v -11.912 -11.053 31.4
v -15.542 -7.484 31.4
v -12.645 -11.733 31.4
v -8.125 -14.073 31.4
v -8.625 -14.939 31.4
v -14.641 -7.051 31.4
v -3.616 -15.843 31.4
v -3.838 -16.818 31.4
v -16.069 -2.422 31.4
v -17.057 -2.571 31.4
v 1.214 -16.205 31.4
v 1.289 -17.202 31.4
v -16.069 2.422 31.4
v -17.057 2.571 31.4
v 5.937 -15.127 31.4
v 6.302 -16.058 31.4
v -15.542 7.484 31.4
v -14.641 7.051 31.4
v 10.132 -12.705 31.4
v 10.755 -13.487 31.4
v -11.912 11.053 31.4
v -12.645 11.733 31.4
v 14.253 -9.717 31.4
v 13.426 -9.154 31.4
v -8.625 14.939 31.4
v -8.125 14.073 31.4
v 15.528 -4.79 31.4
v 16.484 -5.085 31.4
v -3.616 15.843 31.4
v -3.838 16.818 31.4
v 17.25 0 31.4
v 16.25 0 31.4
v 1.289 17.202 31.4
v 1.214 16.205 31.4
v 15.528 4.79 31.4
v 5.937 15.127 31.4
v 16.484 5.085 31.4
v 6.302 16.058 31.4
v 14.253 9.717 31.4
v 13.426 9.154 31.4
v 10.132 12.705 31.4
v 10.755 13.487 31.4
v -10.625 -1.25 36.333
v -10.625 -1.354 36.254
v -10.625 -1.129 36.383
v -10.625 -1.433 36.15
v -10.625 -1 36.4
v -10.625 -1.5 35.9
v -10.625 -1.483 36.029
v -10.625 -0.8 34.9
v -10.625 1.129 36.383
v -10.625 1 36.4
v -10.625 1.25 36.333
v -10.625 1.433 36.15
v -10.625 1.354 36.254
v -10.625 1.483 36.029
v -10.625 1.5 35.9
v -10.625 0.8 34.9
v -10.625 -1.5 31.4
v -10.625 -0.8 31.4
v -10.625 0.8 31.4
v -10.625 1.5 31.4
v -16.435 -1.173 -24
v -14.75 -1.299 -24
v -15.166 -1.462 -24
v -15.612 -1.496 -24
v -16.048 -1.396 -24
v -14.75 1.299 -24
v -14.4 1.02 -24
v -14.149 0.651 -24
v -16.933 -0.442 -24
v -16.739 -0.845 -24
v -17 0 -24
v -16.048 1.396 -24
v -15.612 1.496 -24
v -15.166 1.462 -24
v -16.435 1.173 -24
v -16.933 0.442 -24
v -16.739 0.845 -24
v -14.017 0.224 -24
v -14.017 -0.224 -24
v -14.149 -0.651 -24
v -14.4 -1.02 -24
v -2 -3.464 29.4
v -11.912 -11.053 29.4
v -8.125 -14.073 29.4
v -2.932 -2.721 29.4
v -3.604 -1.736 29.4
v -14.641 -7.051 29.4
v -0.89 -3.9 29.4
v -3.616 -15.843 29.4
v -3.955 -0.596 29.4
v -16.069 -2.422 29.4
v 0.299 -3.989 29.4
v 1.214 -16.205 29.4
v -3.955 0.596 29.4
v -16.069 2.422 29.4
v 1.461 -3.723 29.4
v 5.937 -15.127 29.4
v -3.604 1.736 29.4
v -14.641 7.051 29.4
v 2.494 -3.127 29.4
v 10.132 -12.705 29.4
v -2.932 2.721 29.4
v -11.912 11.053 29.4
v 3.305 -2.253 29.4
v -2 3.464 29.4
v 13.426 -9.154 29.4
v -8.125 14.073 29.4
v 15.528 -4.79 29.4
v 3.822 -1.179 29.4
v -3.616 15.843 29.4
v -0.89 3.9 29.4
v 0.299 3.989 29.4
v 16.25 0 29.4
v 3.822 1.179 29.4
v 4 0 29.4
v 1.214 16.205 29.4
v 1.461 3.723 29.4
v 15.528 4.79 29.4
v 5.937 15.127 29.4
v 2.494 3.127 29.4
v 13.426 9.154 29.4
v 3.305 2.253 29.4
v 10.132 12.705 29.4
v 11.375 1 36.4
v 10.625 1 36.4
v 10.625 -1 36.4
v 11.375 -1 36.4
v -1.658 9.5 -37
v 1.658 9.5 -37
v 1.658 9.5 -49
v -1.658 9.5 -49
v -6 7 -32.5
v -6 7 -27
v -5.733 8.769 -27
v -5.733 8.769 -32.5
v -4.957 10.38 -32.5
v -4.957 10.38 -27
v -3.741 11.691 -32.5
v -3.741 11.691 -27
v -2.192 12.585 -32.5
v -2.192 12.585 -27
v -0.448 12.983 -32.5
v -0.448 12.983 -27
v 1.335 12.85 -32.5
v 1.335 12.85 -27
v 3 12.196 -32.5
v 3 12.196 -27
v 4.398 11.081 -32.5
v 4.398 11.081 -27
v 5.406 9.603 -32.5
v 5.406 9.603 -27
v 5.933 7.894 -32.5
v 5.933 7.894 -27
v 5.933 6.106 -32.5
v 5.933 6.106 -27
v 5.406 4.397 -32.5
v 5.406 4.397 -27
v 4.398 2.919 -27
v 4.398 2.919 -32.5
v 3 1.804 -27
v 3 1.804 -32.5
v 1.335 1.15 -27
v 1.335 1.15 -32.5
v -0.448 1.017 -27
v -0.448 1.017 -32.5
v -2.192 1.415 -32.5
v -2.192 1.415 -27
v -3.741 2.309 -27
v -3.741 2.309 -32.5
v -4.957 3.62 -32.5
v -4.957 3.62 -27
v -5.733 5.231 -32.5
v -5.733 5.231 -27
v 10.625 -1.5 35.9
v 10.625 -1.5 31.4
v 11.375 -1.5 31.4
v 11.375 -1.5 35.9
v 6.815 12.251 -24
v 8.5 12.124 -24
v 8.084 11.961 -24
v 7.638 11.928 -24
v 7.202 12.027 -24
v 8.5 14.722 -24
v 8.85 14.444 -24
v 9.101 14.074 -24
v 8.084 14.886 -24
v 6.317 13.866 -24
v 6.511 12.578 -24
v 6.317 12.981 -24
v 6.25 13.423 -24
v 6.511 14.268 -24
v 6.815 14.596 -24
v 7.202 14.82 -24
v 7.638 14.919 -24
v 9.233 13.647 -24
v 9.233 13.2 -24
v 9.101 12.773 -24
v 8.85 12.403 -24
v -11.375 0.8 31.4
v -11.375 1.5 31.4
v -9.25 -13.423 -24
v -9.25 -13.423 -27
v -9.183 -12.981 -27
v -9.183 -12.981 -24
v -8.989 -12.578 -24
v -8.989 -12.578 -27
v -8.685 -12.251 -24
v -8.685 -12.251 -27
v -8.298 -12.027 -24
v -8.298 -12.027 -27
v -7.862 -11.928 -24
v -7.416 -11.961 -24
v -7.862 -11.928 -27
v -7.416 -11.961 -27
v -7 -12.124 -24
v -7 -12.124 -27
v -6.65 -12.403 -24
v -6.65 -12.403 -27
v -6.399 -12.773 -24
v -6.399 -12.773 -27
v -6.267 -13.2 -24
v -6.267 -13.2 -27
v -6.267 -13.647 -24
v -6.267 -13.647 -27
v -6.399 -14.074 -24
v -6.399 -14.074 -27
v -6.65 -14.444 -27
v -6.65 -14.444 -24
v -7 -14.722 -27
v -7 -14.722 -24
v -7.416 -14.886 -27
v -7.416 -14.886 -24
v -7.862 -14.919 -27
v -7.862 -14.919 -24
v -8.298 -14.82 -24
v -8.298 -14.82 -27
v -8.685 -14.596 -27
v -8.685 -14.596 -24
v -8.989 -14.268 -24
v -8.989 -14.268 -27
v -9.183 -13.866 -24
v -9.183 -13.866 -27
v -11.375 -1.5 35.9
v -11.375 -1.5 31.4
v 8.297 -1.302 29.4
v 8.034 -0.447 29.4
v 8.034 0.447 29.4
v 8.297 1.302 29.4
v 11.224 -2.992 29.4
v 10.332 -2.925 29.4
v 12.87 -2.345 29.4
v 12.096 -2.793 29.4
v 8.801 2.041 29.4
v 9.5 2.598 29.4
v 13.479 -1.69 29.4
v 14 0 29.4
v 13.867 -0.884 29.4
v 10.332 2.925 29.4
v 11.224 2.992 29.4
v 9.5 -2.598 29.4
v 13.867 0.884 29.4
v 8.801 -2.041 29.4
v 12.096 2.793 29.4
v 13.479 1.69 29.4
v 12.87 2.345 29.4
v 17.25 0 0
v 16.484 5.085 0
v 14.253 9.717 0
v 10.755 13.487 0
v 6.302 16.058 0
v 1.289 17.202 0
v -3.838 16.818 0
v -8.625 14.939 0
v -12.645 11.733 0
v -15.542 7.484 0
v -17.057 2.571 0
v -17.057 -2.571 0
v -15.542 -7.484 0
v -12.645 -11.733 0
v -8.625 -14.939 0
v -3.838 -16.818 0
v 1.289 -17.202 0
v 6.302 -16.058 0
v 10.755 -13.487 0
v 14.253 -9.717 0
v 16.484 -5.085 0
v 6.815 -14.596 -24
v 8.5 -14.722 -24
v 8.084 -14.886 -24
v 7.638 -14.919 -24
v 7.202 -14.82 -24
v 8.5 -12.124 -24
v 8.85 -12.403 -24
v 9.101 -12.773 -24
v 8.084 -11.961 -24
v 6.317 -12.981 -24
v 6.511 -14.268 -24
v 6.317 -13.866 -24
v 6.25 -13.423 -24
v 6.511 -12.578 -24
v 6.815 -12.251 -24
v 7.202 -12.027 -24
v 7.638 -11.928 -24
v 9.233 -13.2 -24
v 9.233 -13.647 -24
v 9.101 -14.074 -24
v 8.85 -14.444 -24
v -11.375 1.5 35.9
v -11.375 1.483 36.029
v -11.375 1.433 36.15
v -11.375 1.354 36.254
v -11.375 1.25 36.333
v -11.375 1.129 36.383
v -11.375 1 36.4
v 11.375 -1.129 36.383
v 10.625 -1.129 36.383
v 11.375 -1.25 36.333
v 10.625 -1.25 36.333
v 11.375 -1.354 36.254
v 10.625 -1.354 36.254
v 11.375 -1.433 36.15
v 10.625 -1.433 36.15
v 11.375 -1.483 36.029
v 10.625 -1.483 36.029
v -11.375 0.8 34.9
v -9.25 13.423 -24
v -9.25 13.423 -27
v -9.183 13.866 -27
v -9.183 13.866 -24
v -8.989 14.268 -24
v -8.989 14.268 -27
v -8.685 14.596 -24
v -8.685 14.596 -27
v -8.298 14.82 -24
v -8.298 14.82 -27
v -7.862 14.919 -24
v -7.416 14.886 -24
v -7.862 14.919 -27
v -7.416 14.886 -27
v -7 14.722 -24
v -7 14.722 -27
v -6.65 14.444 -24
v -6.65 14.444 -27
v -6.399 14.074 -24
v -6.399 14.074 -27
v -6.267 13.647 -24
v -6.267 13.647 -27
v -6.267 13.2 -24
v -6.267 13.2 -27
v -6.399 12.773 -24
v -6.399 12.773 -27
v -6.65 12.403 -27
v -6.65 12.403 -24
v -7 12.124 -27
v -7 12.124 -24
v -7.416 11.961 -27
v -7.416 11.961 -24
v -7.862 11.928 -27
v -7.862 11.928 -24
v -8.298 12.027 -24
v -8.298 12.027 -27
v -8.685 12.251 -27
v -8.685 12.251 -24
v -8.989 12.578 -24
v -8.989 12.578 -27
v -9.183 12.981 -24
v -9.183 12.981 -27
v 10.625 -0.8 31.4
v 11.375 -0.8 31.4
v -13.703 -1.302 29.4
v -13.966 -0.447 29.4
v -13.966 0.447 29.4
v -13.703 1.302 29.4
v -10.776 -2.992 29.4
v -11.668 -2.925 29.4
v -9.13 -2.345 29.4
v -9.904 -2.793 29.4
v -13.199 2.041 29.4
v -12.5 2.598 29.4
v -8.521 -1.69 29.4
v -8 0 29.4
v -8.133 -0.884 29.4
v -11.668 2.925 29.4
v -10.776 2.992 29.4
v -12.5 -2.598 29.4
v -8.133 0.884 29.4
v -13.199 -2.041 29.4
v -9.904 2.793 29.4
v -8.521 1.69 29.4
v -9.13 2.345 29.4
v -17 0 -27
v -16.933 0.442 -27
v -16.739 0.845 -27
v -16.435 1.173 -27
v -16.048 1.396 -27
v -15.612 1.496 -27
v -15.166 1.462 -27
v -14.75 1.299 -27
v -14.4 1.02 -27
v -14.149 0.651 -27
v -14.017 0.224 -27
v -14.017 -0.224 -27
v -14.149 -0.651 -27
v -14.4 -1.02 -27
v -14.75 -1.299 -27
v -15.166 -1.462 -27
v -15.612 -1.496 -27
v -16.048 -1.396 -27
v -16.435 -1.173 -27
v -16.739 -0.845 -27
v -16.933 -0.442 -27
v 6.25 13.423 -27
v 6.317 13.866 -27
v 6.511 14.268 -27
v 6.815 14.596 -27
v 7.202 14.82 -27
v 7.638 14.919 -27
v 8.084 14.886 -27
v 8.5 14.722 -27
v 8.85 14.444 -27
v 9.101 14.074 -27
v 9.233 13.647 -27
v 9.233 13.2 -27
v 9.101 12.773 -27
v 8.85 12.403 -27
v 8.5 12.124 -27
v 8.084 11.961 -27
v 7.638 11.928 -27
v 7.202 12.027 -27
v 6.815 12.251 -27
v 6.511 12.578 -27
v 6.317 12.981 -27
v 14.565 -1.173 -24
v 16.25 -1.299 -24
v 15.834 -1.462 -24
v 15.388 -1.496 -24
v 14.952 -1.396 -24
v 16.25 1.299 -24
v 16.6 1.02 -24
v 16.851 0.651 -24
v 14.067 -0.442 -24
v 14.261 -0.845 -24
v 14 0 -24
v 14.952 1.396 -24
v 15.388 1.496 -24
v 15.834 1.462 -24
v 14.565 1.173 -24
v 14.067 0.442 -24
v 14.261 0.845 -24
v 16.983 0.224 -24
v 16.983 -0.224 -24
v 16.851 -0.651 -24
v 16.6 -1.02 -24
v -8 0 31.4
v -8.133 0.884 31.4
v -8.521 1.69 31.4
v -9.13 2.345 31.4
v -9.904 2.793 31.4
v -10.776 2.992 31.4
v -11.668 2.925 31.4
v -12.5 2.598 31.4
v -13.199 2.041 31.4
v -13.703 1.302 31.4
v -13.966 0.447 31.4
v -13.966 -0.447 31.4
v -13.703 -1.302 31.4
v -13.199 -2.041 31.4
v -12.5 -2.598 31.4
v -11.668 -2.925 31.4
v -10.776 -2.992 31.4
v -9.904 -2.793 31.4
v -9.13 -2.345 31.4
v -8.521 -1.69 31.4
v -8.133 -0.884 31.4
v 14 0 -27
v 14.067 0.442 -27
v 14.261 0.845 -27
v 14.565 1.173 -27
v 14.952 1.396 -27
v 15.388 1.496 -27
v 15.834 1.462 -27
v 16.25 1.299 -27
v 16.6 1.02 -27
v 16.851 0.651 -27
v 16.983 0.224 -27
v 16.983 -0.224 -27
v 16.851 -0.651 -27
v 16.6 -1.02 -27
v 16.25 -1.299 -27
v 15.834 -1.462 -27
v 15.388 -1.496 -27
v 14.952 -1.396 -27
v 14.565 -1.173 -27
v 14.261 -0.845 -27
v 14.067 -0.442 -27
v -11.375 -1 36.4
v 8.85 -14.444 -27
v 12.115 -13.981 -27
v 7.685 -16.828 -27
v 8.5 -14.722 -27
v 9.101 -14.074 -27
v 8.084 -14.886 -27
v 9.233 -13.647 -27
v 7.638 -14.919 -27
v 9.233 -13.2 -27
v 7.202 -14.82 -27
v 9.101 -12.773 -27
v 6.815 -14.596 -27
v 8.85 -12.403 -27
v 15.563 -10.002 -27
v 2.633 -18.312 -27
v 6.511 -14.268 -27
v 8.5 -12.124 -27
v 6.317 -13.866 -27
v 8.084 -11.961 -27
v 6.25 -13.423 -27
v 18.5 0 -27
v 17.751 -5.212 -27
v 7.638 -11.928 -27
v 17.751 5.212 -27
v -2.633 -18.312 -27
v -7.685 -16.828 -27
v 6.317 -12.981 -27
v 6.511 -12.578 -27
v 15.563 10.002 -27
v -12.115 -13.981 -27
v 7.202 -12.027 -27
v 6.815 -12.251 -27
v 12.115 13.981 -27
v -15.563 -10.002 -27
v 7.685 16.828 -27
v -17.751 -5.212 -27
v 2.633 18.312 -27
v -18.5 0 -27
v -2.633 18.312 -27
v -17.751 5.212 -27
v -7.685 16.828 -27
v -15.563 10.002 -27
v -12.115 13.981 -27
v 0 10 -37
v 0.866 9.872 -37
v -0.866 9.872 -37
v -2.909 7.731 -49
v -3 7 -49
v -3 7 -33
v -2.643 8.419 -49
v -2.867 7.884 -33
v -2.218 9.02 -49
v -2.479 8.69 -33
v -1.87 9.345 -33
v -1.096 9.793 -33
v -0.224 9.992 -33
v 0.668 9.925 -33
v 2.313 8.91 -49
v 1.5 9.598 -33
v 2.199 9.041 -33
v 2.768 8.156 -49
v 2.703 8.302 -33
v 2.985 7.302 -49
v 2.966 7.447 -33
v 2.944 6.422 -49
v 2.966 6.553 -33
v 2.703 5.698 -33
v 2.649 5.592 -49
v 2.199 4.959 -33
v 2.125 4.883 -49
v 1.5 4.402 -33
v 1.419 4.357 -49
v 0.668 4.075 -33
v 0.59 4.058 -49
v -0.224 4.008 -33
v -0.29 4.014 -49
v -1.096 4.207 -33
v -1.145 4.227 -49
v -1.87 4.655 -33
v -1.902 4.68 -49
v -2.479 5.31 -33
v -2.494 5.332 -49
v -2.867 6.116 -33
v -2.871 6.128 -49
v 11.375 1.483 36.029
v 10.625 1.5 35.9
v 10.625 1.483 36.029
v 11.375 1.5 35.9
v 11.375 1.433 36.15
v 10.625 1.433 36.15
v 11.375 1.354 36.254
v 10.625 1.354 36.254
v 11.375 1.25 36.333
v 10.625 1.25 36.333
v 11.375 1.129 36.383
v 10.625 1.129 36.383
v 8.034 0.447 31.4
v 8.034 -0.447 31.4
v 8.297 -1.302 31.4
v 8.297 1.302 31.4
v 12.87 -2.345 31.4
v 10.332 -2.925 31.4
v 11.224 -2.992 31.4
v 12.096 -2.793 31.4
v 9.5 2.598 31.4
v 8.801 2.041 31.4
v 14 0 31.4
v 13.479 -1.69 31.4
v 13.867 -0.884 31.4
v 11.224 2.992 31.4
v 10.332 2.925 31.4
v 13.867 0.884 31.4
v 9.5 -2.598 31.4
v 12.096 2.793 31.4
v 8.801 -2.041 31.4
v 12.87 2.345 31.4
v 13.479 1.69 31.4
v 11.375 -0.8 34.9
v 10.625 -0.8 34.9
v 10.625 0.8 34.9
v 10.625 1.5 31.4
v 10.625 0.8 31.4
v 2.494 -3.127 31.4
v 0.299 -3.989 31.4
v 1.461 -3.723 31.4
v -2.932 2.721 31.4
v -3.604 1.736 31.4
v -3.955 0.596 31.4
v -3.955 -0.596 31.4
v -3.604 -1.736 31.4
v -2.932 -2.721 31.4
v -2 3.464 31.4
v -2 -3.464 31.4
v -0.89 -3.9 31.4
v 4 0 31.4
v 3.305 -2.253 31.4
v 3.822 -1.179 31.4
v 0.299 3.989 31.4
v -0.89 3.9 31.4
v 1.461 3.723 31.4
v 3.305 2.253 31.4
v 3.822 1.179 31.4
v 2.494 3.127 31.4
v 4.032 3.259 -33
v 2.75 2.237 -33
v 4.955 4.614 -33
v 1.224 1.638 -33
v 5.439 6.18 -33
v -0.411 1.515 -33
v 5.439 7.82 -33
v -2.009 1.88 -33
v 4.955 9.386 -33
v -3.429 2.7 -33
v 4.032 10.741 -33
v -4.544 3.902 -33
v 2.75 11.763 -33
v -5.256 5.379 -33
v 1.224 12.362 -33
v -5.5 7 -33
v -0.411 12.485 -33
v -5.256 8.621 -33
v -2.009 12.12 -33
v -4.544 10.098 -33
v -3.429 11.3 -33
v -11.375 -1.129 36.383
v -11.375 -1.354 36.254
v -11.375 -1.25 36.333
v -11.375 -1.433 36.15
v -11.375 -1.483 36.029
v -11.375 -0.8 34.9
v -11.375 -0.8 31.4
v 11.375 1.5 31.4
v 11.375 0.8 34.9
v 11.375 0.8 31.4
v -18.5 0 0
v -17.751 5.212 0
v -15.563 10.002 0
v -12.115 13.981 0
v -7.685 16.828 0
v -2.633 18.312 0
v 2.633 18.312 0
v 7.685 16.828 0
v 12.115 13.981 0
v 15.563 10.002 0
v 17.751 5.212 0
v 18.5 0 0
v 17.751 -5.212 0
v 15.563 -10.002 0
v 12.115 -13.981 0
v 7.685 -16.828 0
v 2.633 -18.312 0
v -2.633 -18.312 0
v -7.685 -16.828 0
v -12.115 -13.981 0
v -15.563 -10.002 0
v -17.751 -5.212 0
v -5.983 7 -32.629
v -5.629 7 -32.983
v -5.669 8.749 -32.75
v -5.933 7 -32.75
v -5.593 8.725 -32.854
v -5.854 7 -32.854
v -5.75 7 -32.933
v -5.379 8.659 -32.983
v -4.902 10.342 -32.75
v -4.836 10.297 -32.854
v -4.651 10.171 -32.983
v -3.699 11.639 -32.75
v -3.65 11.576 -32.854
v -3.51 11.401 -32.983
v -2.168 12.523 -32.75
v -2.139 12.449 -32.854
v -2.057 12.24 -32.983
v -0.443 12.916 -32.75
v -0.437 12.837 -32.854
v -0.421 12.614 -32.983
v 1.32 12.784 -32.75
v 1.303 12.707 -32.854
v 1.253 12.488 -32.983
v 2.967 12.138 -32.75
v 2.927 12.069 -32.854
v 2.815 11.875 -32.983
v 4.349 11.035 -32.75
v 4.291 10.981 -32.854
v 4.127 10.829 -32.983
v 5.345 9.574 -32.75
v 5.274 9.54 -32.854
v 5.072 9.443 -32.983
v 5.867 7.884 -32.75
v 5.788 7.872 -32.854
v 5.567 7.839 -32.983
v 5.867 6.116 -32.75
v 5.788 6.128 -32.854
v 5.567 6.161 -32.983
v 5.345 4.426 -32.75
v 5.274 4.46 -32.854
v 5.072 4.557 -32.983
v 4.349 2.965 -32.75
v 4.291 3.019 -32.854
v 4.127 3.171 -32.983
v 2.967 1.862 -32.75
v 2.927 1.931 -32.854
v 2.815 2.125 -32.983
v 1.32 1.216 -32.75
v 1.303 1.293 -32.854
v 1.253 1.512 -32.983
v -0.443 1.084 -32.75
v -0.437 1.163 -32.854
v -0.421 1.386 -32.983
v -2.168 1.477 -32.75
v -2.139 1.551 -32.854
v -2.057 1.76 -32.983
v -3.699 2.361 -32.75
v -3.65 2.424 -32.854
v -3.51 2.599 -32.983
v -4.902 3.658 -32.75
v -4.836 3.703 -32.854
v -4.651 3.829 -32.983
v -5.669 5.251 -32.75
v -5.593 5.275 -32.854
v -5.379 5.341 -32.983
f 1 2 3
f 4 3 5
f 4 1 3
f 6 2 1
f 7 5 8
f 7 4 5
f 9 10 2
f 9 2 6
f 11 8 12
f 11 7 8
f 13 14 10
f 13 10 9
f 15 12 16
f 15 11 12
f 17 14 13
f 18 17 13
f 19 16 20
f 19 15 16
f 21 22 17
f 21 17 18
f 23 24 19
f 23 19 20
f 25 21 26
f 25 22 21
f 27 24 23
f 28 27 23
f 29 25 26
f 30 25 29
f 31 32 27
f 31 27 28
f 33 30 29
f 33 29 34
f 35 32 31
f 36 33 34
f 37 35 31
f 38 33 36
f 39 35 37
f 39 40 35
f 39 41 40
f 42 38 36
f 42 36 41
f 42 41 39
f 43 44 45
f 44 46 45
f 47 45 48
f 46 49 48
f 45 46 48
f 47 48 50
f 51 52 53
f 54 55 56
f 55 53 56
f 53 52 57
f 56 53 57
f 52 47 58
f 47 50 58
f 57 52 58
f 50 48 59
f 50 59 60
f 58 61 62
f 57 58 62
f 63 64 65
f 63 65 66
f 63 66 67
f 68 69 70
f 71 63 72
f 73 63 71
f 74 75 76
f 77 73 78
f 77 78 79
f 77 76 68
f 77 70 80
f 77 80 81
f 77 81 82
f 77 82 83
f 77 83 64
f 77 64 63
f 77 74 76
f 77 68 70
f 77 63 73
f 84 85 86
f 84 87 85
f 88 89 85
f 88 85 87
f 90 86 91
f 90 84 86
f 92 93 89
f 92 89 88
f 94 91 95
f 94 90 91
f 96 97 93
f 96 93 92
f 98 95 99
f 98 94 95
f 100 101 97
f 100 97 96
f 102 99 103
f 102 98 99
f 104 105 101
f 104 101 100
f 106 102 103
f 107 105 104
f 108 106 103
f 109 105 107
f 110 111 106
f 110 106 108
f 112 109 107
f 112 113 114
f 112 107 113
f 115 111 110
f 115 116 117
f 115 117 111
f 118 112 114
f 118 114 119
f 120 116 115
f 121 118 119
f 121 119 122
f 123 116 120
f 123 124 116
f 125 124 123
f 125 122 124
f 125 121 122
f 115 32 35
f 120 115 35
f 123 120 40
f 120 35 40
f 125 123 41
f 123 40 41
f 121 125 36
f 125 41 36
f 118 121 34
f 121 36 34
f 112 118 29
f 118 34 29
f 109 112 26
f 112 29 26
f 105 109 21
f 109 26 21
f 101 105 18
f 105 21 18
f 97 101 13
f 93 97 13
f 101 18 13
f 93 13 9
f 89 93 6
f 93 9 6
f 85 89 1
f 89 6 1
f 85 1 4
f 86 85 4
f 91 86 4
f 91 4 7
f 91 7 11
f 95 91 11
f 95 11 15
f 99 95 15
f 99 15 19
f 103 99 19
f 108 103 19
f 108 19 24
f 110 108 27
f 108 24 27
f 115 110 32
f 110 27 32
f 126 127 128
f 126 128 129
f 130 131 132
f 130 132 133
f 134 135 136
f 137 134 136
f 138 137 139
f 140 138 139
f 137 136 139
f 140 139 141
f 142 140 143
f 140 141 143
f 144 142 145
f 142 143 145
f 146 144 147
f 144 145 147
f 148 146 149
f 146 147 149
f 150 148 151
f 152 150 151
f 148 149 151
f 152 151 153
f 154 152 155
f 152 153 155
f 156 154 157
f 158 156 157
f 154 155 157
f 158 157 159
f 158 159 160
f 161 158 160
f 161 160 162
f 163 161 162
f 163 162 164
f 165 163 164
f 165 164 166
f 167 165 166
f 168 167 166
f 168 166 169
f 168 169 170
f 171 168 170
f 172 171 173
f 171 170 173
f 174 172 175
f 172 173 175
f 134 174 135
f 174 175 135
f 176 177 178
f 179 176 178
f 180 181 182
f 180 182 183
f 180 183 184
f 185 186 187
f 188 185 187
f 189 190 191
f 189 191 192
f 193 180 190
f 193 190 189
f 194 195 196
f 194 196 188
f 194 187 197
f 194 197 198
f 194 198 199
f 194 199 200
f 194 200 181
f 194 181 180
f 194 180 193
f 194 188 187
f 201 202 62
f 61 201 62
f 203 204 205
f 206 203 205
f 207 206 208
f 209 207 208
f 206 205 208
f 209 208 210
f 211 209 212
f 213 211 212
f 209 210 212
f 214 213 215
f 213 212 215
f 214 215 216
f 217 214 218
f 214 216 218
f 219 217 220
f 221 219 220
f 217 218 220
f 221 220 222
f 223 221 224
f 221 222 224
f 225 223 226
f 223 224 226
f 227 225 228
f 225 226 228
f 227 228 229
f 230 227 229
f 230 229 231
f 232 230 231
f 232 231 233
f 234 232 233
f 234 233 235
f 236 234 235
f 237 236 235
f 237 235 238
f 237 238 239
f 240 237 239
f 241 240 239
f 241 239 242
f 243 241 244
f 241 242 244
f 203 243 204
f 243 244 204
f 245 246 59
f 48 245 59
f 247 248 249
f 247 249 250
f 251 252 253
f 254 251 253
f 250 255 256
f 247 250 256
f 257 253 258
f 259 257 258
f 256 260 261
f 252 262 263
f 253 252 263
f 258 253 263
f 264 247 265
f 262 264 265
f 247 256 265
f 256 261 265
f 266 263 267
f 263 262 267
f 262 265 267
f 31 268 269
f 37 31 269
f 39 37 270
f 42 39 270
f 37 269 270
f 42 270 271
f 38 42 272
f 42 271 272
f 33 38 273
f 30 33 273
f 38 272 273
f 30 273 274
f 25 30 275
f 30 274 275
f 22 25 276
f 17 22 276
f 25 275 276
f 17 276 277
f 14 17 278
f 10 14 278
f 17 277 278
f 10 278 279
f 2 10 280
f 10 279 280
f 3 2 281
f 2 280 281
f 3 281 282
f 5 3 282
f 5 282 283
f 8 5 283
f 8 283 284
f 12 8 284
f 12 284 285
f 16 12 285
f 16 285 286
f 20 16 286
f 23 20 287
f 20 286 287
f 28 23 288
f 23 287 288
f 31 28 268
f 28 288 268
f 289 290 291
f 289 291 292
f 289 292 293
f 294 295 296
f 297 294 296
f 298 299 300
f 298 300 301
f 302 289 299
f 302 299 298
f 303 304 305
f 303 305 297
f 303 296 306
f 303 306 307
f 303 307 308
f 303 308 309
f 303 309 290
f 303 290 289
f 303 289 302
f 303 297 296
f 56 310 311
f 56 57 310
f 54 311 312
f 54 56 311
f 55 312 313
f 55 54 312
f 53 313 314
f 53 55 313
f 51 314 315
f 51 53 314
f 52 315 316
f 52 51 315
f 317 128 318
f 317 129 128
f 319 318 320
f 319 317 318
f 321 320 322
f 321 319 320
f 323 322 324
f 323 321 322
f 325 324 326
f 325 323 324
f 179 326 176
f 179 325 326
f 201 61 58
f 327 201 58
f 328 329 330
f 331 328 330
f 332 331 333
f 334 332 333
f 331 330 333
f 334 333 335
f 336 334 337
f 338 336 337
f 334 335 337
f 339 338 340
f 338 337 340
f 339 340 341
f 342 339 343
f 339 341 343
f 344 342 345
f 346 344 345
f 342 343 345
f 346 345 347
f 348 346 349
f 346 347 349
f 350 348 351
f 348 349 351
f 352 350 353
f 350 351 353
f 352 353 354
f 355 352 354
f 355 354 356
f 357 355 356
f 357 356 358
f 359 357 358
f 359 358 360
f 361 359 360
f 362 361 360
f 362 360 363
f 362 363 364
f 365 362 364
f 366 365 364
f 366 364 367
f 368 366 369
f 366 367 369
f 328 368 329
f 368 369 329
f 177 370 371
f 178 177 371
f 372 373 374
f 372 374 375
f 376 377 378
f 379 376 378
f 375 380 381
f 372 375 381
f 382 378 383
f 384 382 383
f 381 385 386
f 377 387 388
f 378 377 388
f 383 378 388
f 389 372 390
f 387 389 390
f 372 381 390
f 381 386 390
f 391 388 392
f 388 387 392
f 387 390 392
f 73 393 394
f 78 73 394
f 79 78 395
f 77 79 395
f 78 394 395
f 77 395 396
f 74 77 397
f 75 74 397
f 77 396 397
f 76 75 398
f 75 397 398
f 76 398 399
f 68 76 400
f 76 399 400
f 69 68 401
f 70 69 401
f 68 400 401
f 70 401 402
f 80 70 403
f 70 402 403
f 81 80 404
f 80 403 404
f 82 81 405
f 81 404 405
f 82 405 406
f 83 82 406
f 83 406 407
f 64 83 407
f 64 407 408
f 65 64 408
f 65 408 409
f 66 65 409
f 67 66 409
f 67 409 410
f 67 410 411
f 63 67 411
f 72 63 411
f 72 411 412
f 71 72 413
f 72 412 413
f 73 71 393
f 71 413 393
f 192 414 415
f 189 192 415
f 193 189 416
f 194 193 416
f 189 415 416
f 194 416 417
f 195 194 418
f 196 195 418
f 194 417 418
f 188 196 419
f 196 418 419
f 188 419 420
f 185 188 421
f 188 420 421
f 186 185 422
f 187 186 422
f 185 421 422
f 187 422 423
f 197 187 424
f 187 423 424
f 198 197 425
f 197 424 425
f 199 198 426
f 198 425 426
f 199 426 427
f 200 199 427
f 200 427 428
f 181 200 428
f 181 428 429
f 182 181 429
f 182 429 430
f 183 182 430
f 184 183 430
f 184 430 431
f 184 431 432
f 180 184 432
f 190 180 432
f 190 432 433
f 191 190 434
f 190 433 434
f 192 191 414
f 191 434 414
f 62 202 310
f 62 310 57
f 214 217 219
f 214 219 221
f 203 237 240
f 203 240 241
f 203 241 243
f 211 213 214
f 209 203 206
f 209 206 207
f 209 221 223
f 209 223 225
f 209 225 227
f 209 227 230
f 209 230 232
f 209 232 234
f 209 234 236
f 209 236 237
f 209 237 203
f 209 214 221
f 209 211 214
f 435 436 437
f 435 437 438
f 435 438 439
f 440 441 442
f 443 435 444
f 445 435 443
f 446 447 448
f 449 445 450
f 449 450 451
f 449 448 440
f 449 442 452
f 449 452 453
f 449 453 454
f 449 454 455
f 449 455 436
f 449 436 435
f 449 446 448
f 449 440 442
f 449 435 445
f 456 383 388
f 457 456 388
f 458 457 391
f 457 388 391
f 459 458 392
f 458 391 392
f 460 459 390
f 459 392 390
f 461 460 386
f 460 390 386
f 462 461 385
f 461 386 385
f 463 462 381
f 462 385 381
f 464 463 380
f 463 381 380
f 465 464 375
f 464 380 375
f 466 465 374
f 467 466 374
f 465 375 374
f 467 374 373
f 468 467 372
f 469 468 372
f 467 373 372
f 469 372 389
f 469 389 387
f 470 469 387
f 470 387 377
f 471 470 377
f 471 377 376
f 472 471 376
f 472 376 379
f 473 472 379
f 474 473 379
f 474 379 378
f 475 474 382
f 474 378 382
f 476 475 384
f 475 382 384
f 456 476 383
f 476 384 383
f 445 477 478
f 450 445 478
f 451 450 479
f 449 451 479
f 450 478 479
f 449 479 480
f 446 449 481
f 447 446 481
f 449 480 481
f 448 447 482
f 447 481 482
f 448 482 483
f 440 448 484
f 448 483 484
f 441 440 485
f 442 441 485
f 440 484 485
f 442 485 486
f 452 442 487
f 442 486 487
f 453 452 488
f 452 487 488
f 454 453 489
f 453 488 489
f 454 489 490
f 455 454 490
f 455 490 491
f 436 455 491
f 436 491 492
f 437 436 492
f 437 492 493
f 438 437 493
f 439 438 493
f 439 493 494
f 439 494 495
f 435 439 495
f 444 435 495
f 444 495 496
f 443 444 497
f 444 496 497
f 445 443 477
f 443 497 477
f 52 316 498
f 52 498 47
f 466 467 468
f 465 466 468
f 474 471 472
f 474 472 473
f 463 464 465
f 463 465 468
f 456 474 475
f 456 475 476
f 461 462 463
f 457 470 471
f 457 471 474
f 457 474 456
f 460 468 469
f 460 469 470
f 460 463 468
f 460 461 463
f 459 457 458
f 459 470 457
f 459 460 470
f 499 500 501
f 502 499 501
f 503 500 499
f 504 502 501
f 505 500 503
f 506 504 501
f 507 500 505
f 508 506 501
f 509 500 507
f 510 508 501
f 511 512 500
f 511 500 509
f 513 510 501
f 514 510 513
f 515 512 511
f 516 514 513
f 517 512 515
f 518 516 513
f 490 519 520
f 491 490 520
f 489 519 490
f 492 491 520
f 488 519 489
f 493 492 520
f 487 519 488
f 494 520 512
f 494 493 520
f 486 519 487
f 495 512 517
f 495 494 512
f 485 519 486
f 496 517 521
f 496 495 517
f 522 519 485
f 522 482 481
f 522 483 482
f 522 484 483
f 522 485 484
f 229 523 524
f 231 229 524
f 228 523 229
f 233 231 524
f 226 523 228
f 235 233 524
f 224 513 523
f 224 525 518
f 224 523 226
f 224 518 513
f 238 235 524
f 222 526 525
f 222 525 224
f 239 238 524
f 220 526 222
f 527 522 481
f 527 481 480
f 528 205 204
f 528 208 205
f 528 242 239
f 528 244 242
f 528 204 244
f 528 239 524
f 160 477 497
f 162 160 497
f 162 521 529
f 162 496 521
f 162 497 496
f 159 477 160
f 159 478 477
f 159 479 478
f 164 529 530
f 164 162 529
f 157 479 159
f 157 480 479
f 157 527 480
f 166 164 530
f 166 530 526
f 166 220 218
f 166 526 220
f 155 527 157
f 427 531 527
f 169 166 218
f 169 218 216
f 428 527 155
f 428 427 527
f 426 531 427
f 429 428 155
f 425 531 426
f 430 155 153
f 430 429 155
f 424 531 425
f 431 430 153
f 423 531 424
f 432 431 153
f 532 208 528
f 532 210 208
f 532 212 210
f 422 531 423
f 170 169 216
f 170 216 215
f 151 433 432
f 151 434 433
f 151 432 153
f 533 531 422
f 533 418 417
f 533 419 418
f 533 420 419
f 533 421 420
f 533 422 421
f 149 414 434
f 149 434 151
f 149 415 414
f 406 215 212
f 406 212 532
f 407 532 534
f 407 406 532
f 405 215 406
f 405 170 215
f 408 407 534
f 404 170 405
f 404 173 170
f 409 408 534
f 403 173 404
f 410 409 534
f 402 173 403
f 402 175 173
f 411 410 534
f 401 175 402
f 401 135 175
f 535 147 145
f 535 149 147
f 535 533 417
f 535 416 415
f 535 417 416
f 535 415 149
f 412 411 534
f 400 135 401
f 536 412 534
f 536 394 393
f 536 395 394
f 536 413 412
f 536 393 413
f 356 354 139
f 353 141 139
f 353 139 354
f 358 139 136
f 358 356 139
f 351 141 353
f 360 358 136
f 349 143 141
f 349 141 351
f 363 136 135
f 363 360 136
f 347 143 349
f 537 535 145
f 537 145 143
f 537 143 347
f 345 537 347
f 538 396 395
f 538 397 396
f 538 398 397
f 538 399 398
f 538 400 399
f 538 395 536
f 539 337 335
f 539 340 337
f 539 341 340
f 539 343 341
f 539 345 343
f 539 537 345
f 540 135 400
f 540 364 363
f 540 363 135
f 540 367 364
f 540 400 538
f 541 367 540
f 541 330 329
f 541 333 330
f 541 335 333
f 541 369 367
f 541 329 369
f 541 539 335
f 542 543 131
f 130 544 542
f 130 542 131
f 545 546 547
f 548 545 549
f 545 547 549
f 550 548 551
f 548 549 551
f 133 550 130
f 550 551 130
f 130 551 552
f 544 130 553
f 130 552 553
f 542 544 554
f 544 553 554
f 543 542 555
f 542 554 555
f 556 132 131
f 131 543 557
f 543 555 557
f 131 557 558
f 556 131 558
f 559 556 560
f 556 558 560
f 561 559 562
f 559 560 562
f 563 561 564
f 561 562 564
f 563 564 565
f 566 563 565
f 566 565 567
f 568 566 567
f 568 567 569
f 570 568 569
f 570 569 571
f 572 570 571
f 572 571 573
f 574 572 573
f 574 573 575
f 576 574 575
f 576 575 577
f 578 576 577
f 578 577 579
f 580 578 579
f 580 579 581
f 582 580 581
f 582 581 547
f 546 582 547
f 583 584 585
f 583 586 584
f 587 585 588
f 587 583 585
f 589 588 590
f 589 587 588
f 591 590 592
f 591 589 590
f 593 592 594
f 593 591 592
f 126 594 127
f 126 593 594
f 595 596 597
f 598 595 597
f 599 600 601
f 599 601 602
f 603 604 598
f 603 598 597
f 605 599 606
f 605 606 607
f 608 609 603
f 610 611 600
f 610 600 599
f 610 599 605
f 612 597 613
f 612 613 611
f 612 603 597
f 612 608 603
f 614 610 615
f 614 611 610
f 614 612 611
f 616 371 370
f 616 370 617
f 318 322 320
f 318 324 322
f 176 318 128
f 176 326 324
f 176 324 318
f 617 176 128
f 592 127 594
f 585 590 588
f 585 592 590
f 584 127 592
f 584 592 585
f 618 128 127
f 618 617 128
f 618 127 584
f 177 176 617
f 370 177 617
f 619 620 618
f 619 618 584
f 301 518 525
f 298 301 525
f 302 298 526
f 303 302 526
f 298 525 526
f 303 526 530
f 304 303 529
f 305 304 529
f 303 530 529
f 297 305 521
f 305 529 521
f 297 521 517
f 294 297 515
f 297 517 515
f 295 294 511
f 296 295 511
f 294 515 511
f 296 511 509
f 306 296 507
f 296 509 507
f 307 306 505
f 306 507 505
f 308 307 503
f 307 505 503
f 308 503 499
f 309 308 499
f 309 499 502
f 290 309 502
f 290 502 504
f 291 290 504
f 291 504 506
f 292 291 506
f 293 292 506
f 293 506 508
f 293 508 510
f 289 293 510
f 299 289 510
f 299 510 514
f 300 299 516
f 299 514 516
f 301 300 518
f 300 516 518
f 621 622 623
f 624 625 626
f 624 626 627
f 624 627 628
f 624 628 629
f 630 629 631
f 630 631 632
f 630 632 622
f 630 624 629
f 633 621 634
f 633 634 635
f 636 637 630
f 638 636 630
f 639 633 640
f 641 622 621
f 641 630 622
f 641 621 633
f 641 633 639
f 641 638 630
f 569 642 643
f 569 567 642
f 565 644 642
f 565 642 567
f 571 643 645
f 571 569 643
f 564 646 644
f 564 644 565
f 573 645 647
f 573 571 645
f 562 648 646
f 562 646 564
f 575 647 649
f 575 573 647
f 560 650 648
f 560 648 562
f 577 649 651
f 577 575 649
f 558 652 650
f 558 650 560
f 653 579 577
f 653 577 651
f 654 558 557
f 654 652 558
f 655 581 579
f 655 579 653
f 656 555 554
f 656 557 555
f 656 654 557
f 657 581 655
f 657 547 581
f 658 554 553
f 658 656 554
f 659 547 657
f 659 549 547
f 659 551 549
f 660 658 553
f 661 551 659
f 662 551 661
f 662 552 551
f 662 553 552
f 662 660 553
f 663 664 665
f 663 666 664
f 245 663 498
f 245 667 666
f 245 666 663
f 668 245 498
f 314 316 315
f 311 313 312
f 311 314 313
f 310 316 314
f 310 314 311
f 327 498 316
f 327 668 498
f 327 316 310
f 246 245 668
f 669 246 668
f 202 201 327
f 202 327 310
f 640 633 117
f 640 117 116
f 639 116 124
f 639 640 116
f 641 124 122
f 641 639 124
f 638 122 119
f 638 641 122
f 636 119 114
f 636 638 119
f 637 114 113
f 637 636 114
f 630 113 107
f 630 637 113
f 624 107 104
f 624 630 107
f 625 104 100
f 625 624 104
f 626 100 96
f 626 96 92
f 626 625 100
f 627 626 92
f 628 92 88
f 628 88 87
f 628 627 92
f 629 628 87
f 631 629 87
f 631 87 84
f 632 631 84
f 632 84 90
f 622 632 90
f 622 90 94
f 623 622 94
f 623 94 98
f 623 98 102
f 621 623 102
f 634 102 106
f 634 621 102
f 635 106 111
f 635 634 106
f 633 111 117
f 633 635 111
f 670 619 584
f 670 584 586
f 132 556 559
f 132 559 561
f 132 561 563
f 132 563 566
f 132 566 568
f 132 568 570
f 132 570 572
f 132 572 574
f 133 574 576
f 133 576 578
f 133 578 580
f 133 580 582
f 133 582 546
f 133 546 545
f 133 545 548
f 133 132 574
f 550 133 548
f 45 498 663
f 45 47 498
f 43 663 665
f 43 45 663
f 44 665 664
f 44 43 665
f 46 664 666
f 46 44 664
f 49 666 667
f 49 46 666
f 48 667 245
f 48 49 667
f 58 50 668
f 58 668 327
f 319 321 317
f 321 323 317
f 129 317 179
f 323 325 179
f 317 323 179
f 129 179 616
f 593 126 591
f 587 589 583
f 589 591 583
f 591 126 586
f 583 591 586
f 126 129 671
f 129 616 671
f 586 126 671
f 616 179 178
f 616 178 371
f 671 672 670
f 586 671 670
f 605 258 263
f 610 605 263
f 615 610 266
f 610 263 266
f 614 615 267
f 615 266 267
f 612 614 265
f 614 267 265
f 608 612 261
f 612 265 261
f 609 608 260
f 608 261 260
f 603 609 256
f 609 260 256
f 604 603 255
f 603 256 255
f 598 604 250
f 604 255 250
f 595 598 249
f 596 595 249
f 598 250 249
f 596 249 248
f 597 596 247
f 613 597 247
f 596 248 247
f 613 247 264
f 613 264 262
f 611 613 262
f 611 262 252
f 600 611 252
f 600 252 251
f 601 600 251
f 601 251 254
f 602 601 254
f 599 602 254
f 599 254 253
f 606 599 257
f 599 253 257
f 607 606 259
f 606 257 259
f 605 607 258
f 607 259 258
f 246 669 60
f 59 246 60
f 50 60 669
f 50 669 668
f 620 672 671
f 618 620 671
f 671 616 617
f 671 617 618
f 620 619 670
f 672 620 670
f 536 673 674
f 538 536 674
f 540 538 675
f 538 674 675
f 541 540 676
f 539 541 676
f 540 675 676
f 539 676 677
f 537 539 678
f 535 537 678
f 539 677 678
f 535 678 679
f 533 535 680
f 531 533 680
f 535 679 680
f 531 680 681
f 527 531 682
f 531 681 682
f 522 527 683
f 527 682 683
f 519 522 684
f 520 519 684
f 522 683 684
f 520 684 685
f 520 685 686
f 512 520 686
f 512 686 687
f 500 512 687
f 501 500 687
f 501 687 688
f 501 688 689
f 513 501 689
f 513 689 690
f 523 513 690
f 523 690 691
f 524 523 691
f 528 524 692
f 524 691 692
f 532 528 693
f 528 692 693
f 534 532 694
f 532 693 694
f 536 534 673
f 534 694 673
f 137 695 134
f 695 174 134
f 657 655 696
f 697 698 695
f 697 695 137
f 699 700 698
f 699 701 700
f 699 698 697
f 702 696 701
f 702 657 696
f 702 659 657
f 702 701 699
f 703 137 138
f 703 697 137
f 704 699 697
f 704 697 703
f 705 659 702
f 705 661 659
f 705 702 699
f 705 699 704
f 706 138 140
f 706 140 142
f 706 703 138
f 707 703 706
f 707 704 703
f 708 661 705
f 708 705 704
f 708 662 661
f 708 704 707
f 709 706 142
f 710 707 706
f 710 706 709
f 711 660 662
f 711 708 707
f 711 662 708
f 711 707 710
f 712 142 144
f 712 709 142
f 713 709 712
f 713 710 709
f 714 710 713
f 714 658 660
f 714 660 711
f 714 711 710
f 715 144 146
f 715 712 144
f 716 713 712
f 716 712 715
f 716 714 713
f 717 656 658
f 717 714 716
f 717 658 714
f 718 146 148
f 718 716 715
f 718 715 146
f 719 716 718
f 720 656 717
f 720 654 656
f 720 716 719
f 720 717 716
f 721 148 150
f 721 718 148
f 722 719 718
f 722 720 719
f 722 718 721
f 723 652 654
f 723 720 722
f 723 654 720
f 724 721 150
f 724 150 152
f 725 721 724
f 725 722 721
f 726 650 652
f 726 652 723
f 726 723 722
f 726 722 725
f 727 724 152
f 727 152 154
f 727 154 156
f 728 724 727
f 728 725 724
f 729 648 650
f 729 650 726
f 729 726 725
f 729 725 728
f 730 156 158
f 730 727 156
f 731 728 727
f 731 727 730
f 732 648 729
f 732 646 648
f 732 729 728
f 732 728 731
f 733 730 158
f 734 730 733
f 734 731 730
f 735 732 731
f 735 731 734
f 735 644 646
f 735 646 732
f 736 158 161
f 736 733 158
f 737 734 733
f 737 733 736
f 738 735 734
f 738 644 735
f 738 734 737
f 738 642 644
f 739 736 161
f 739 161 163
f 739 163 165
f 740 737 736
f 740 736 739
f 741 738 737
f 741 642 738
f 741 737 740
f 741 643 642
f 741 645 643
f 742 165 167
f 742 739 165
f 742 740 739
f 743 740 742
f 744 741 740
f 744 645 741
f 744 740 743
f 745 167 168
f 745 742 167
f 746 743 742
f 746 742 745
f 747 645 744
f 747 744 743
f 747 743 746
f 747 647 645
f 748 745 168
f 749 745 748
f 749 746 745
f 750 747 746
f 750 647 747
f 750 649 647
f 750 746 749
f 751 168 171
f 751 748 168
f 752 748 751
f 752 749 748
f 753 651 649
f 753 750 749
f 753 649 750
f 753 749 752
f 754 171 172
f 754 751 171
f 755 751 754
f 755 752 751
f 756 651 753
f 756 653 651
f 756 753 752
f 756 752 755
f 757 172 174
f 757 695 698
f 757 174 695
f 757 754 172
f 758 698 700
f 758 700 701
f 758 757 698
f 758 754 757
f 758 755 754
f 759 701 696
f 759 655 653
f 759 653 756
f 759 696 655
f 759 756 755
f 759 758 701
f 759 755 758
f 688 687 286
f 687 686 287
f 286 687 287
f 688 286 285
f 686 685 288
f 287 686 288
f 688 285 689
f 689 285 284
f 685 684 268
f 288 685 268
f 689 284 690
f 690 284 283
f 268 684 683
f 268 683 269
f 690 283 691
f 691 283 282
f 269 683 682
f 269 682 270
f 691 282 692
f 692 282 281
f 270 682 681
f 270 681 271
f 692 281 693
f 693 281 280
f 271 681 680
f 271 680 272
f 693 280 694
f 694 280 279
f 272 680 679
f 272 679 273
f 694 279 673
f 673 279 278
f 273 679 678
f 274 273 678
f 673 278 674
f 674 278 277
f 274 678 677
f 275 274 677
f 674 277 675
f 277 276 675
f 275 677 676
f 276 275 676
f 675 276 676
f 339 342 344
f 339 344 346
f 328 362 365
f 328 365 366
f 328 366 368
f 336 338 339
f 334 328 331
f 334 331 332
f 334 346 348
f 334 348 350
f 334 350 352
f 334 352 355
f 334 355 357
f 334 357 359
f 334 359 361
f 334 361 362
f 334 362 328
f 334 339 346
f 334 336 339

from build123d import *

# Parameters (mm, degrees)
CROQUIS1_R                = 17.25
SALIENTE_EXTRUIR1_DEPTH   = 31.4
CROQUIS2_R                = 18.5
SALIENTE_EXTRUIR2_DEPTH   = 27
CROQUIS3_R                = 6
SALIENTE_EXTRUIR3_DEPTH   = 6
CROQUIS4_R                = 3
SALIENTE_EXTRUIR4_DEPTH   = 16
CORTAR_EXTRUIR1_START     = -12
CORTAR_EXTRUIR1_DEPTH     = 12
CROQUIS8_R                = 16.25
CROQUIS8_R_2              = 4
CORTAR_EXTRUIR2_DEPTH     = 2
CROQUIS9_R                = 3
SALIENTE_EXTRUIR5_DEPTH   = 2
SALIENTE_EXTRUIR5_2_DEPTH = 2
CROQUIS10_W               = 0.75
CROQUIS10_H               = 3
SALIENTE_EXTRUIR6_DEPTH   = 5
SALIENTE_EXTRUIR6_2_DEPTH = 5
CORTAR_EXTRUIR3_START     = -25.375
CROQUIS11_W               = 3.5
CROQUIS11_H               = 1.6
CORTAR_EXTRUIR3_DEPTH     = 28
REDONDEO1_R               = 0.5
REDONDEO2_R               = 0.5
REDONDEO3_R               = 0.5
CROQUIS12_R               = 1.5
CORTAR_EXTRUIR4_DEPTH     = 3


with BuildPart() as part:
    # Croquis1 → Saliente-Extruir1 (new body)
    with BuildSketch(Plane.XY):
        Circle(CROQUIS1_R)
    extrude(amount=SALIENTE_EXTRUIR1_DEPTH)

    # Croquis2 → Saliente-Extruir2 (add)
    with BuildSketch(Plane(origin=(0, 0, 0), x_dir=(-1, 0, 0), z_dir=(0, 0, -1))):
        Circle(CROQUIS2_R)
    extrude(amount=SALIENTE_EXTRUIR2_DEPTH)

    # Croquis3 → Saliente-Extruir3 (add)
    with BuildSketch(Plane(origin=(0, 0, -27), x_dir=(-1, 0, 0), z_dir=(0, 0, -1))):
        with Locations((0, 7)):
            Circle(CROQUIS3_R)
    extrude(amount=SALIENTE_EXTRUIR3_DEPTH)

    # Croquis4 → Saliente-Extruir4 (add)
    with BuildSketch(Plane(origin=(0, 0, -33), x_dir=(-1, 0, 0), z_dir=(0, 0, -1))):
        with Locations((0, 7)):
            Circle(CROQUIS4_R)
    extrude(amount=SALIENTE_EXTRUIR4_DEPTH)

    # Croquis5 → Cortar-Extruir1 (cut)
    with BuildSketch(Plane(origin=(0, 0, -49), x_dir=(-1, 0, 0), z_dir=(0, 0, -1)).offset(CORTAR_EXTRUIR1_START)):
        with BuildLine():
            Line((-1.658312395, 9.5), (1.658312395, 9.5))
            ThreePointArc((1.658312395, 9.5), (0, 10), (-1.658312395, 9.5))
        make_face()
    extrude(amount=CORTAR_EXTRUIR1_DEPTH, mode=Mode.SUBTRACT)

    # Croquis8 → Cortar-Extruir2 (cut)
    with BuildSketch(Plane.XY.offset(31.4)):
        Circle(CROQUIS8_R)
        Circle(CROQUIS8_R_2, mode=Mode.SUBTRACT)
    extrude(amount=-CORTAR_EXTRUIR2_DEPTH, mode=Mode.SUBTRACT)

    # Redondeo3
    redondeo3_edges = [part.edges().sort_by_distance(p)[0] for p in [
        (6, 7, -33),
    ]]
    fillet(redondeo3_edges, radius=REDONDEO3_R)

    # Croquis12 → Cortar-Extruir4 (cut)
    with BuildSketch(Plane(origin=(0, 0, -27), x_dir=(-1, 0, 0), z_dir=(0, 0, -1))):
        with Locations((-15.5, 0)):
            Circle(CROQUIS12_R)
        with Locations((-7.75, 13.423393759)):
            Circle(CROQUIS12_R)
        with Locations((7.75, 13.423393759)):
            Circle(CROQUIS12_R)
        with Locations((15.5, 0)):
            Circle(CROQUIS12_R)
        with Locations((7.75, -13.423393759)):
            Circle(CROQUIS12_R)
        with Locations((-7.75, -13.423393759)):
            Circle(CROQUIS12_R)
    extrude(amount=-CORTAR_EXTRUIR4_DEPTH, mode=Mode.SUBTRACT)


with BuildPart() as body_2:
    # Croquis9 → Saliente-Extruir5 (new body)
    with BuildSketch(Plane.XY.offset(29.4)):
        with Locations((-11, 0)):
            Circle(CROQUIS9_R)
    extrude(amount=SALIENTE_EXTRUIR5_DEPTH)


with BuildPart() as body_3:
    # Croquis9 → Saliente-Extruir5 2 (new body)
    with BuildSketch(Plane.XY.offset(29.4)):
        with Locations((11, 0)):
            Circle(CROQUIS9_R)
    extrude(amount=SALIENTE_EXTRUIR5_2_DEPTH)


with BuildPart() as body_4:
    # Croquis10 → Saliente-Extruir6 (new body)
    with BuildSketch(Plane.XY.offset(31.4)):
        with Locations((-11, 0)):
            Rectangle(CROQUIS10_W, CROQUIS10_H)
    extrude(amount=SALIENTE_EXTRUIR6_DEPTH)


with BuildPart() as body_5:
    # Croquis10 → Saliente-Extruir6 2 (new body)
    with BuildSketch(Plane.XY.offset(31.4)):
        with Locations((11, 0)):
            Rectangle(CROQUIS10_W, CROQUIS10_H)
    extrude(amount=SALIENTE_EXTRUIR6_2_DEPTH)


with BuildPart() as cortar_extruir3_tool:
    # Croquis11 → Cortar-Extruir3 (new body)
    with BuildSketch(Plane.ZY.offset(11.375).offset(CORTAR_EXTRUIR3_START)):
        with Locations((33.15, 0)):
            Rectangle(CROQUIS11_W, CROQUIS11_H)
    extrude(amount=CORTAR_EXTRUIR3_DEPTH)


with BuildPart() as body_4_1:
    add(body_4.part)

    # Cortar-Extruir3: cut by cortar_extruir3_tool
    add(cortar_extruir3_tool.part, mode=Mode.SUBTRACT)

    # Redondeo1
    redondeo1_edges = [body_4_1.edges().sort_by_distance(p)[0] for p in [
        (-11, 1.5, 36.4),
        (-11, -1.5, 36.4),
    ]]
    fillet(redondeo1_edges, radius=REDONDEO1_R)


with BuildPart() as body_5_1:
    add(body_5.part)

    # Cortar-Extruir3: cut by cortar_extruir3_tool
    add(cortar_extruir3_tool.part, mode=Mode.SUBTRACT)

    # Redondeo2
    redondeo2_edges = [body_5_1.edges().sort_by_distance(p)[0] for p in [
        (11, 1.5, 36.4),
        (11, -1.5, 36.4),
    ]]
    fillet(redondeo2_edges, radius=REDONDEO2_R)


solid = Compound([part.part, body_2.part, body_3.part, body_4_1.part, body_5_1.part])
